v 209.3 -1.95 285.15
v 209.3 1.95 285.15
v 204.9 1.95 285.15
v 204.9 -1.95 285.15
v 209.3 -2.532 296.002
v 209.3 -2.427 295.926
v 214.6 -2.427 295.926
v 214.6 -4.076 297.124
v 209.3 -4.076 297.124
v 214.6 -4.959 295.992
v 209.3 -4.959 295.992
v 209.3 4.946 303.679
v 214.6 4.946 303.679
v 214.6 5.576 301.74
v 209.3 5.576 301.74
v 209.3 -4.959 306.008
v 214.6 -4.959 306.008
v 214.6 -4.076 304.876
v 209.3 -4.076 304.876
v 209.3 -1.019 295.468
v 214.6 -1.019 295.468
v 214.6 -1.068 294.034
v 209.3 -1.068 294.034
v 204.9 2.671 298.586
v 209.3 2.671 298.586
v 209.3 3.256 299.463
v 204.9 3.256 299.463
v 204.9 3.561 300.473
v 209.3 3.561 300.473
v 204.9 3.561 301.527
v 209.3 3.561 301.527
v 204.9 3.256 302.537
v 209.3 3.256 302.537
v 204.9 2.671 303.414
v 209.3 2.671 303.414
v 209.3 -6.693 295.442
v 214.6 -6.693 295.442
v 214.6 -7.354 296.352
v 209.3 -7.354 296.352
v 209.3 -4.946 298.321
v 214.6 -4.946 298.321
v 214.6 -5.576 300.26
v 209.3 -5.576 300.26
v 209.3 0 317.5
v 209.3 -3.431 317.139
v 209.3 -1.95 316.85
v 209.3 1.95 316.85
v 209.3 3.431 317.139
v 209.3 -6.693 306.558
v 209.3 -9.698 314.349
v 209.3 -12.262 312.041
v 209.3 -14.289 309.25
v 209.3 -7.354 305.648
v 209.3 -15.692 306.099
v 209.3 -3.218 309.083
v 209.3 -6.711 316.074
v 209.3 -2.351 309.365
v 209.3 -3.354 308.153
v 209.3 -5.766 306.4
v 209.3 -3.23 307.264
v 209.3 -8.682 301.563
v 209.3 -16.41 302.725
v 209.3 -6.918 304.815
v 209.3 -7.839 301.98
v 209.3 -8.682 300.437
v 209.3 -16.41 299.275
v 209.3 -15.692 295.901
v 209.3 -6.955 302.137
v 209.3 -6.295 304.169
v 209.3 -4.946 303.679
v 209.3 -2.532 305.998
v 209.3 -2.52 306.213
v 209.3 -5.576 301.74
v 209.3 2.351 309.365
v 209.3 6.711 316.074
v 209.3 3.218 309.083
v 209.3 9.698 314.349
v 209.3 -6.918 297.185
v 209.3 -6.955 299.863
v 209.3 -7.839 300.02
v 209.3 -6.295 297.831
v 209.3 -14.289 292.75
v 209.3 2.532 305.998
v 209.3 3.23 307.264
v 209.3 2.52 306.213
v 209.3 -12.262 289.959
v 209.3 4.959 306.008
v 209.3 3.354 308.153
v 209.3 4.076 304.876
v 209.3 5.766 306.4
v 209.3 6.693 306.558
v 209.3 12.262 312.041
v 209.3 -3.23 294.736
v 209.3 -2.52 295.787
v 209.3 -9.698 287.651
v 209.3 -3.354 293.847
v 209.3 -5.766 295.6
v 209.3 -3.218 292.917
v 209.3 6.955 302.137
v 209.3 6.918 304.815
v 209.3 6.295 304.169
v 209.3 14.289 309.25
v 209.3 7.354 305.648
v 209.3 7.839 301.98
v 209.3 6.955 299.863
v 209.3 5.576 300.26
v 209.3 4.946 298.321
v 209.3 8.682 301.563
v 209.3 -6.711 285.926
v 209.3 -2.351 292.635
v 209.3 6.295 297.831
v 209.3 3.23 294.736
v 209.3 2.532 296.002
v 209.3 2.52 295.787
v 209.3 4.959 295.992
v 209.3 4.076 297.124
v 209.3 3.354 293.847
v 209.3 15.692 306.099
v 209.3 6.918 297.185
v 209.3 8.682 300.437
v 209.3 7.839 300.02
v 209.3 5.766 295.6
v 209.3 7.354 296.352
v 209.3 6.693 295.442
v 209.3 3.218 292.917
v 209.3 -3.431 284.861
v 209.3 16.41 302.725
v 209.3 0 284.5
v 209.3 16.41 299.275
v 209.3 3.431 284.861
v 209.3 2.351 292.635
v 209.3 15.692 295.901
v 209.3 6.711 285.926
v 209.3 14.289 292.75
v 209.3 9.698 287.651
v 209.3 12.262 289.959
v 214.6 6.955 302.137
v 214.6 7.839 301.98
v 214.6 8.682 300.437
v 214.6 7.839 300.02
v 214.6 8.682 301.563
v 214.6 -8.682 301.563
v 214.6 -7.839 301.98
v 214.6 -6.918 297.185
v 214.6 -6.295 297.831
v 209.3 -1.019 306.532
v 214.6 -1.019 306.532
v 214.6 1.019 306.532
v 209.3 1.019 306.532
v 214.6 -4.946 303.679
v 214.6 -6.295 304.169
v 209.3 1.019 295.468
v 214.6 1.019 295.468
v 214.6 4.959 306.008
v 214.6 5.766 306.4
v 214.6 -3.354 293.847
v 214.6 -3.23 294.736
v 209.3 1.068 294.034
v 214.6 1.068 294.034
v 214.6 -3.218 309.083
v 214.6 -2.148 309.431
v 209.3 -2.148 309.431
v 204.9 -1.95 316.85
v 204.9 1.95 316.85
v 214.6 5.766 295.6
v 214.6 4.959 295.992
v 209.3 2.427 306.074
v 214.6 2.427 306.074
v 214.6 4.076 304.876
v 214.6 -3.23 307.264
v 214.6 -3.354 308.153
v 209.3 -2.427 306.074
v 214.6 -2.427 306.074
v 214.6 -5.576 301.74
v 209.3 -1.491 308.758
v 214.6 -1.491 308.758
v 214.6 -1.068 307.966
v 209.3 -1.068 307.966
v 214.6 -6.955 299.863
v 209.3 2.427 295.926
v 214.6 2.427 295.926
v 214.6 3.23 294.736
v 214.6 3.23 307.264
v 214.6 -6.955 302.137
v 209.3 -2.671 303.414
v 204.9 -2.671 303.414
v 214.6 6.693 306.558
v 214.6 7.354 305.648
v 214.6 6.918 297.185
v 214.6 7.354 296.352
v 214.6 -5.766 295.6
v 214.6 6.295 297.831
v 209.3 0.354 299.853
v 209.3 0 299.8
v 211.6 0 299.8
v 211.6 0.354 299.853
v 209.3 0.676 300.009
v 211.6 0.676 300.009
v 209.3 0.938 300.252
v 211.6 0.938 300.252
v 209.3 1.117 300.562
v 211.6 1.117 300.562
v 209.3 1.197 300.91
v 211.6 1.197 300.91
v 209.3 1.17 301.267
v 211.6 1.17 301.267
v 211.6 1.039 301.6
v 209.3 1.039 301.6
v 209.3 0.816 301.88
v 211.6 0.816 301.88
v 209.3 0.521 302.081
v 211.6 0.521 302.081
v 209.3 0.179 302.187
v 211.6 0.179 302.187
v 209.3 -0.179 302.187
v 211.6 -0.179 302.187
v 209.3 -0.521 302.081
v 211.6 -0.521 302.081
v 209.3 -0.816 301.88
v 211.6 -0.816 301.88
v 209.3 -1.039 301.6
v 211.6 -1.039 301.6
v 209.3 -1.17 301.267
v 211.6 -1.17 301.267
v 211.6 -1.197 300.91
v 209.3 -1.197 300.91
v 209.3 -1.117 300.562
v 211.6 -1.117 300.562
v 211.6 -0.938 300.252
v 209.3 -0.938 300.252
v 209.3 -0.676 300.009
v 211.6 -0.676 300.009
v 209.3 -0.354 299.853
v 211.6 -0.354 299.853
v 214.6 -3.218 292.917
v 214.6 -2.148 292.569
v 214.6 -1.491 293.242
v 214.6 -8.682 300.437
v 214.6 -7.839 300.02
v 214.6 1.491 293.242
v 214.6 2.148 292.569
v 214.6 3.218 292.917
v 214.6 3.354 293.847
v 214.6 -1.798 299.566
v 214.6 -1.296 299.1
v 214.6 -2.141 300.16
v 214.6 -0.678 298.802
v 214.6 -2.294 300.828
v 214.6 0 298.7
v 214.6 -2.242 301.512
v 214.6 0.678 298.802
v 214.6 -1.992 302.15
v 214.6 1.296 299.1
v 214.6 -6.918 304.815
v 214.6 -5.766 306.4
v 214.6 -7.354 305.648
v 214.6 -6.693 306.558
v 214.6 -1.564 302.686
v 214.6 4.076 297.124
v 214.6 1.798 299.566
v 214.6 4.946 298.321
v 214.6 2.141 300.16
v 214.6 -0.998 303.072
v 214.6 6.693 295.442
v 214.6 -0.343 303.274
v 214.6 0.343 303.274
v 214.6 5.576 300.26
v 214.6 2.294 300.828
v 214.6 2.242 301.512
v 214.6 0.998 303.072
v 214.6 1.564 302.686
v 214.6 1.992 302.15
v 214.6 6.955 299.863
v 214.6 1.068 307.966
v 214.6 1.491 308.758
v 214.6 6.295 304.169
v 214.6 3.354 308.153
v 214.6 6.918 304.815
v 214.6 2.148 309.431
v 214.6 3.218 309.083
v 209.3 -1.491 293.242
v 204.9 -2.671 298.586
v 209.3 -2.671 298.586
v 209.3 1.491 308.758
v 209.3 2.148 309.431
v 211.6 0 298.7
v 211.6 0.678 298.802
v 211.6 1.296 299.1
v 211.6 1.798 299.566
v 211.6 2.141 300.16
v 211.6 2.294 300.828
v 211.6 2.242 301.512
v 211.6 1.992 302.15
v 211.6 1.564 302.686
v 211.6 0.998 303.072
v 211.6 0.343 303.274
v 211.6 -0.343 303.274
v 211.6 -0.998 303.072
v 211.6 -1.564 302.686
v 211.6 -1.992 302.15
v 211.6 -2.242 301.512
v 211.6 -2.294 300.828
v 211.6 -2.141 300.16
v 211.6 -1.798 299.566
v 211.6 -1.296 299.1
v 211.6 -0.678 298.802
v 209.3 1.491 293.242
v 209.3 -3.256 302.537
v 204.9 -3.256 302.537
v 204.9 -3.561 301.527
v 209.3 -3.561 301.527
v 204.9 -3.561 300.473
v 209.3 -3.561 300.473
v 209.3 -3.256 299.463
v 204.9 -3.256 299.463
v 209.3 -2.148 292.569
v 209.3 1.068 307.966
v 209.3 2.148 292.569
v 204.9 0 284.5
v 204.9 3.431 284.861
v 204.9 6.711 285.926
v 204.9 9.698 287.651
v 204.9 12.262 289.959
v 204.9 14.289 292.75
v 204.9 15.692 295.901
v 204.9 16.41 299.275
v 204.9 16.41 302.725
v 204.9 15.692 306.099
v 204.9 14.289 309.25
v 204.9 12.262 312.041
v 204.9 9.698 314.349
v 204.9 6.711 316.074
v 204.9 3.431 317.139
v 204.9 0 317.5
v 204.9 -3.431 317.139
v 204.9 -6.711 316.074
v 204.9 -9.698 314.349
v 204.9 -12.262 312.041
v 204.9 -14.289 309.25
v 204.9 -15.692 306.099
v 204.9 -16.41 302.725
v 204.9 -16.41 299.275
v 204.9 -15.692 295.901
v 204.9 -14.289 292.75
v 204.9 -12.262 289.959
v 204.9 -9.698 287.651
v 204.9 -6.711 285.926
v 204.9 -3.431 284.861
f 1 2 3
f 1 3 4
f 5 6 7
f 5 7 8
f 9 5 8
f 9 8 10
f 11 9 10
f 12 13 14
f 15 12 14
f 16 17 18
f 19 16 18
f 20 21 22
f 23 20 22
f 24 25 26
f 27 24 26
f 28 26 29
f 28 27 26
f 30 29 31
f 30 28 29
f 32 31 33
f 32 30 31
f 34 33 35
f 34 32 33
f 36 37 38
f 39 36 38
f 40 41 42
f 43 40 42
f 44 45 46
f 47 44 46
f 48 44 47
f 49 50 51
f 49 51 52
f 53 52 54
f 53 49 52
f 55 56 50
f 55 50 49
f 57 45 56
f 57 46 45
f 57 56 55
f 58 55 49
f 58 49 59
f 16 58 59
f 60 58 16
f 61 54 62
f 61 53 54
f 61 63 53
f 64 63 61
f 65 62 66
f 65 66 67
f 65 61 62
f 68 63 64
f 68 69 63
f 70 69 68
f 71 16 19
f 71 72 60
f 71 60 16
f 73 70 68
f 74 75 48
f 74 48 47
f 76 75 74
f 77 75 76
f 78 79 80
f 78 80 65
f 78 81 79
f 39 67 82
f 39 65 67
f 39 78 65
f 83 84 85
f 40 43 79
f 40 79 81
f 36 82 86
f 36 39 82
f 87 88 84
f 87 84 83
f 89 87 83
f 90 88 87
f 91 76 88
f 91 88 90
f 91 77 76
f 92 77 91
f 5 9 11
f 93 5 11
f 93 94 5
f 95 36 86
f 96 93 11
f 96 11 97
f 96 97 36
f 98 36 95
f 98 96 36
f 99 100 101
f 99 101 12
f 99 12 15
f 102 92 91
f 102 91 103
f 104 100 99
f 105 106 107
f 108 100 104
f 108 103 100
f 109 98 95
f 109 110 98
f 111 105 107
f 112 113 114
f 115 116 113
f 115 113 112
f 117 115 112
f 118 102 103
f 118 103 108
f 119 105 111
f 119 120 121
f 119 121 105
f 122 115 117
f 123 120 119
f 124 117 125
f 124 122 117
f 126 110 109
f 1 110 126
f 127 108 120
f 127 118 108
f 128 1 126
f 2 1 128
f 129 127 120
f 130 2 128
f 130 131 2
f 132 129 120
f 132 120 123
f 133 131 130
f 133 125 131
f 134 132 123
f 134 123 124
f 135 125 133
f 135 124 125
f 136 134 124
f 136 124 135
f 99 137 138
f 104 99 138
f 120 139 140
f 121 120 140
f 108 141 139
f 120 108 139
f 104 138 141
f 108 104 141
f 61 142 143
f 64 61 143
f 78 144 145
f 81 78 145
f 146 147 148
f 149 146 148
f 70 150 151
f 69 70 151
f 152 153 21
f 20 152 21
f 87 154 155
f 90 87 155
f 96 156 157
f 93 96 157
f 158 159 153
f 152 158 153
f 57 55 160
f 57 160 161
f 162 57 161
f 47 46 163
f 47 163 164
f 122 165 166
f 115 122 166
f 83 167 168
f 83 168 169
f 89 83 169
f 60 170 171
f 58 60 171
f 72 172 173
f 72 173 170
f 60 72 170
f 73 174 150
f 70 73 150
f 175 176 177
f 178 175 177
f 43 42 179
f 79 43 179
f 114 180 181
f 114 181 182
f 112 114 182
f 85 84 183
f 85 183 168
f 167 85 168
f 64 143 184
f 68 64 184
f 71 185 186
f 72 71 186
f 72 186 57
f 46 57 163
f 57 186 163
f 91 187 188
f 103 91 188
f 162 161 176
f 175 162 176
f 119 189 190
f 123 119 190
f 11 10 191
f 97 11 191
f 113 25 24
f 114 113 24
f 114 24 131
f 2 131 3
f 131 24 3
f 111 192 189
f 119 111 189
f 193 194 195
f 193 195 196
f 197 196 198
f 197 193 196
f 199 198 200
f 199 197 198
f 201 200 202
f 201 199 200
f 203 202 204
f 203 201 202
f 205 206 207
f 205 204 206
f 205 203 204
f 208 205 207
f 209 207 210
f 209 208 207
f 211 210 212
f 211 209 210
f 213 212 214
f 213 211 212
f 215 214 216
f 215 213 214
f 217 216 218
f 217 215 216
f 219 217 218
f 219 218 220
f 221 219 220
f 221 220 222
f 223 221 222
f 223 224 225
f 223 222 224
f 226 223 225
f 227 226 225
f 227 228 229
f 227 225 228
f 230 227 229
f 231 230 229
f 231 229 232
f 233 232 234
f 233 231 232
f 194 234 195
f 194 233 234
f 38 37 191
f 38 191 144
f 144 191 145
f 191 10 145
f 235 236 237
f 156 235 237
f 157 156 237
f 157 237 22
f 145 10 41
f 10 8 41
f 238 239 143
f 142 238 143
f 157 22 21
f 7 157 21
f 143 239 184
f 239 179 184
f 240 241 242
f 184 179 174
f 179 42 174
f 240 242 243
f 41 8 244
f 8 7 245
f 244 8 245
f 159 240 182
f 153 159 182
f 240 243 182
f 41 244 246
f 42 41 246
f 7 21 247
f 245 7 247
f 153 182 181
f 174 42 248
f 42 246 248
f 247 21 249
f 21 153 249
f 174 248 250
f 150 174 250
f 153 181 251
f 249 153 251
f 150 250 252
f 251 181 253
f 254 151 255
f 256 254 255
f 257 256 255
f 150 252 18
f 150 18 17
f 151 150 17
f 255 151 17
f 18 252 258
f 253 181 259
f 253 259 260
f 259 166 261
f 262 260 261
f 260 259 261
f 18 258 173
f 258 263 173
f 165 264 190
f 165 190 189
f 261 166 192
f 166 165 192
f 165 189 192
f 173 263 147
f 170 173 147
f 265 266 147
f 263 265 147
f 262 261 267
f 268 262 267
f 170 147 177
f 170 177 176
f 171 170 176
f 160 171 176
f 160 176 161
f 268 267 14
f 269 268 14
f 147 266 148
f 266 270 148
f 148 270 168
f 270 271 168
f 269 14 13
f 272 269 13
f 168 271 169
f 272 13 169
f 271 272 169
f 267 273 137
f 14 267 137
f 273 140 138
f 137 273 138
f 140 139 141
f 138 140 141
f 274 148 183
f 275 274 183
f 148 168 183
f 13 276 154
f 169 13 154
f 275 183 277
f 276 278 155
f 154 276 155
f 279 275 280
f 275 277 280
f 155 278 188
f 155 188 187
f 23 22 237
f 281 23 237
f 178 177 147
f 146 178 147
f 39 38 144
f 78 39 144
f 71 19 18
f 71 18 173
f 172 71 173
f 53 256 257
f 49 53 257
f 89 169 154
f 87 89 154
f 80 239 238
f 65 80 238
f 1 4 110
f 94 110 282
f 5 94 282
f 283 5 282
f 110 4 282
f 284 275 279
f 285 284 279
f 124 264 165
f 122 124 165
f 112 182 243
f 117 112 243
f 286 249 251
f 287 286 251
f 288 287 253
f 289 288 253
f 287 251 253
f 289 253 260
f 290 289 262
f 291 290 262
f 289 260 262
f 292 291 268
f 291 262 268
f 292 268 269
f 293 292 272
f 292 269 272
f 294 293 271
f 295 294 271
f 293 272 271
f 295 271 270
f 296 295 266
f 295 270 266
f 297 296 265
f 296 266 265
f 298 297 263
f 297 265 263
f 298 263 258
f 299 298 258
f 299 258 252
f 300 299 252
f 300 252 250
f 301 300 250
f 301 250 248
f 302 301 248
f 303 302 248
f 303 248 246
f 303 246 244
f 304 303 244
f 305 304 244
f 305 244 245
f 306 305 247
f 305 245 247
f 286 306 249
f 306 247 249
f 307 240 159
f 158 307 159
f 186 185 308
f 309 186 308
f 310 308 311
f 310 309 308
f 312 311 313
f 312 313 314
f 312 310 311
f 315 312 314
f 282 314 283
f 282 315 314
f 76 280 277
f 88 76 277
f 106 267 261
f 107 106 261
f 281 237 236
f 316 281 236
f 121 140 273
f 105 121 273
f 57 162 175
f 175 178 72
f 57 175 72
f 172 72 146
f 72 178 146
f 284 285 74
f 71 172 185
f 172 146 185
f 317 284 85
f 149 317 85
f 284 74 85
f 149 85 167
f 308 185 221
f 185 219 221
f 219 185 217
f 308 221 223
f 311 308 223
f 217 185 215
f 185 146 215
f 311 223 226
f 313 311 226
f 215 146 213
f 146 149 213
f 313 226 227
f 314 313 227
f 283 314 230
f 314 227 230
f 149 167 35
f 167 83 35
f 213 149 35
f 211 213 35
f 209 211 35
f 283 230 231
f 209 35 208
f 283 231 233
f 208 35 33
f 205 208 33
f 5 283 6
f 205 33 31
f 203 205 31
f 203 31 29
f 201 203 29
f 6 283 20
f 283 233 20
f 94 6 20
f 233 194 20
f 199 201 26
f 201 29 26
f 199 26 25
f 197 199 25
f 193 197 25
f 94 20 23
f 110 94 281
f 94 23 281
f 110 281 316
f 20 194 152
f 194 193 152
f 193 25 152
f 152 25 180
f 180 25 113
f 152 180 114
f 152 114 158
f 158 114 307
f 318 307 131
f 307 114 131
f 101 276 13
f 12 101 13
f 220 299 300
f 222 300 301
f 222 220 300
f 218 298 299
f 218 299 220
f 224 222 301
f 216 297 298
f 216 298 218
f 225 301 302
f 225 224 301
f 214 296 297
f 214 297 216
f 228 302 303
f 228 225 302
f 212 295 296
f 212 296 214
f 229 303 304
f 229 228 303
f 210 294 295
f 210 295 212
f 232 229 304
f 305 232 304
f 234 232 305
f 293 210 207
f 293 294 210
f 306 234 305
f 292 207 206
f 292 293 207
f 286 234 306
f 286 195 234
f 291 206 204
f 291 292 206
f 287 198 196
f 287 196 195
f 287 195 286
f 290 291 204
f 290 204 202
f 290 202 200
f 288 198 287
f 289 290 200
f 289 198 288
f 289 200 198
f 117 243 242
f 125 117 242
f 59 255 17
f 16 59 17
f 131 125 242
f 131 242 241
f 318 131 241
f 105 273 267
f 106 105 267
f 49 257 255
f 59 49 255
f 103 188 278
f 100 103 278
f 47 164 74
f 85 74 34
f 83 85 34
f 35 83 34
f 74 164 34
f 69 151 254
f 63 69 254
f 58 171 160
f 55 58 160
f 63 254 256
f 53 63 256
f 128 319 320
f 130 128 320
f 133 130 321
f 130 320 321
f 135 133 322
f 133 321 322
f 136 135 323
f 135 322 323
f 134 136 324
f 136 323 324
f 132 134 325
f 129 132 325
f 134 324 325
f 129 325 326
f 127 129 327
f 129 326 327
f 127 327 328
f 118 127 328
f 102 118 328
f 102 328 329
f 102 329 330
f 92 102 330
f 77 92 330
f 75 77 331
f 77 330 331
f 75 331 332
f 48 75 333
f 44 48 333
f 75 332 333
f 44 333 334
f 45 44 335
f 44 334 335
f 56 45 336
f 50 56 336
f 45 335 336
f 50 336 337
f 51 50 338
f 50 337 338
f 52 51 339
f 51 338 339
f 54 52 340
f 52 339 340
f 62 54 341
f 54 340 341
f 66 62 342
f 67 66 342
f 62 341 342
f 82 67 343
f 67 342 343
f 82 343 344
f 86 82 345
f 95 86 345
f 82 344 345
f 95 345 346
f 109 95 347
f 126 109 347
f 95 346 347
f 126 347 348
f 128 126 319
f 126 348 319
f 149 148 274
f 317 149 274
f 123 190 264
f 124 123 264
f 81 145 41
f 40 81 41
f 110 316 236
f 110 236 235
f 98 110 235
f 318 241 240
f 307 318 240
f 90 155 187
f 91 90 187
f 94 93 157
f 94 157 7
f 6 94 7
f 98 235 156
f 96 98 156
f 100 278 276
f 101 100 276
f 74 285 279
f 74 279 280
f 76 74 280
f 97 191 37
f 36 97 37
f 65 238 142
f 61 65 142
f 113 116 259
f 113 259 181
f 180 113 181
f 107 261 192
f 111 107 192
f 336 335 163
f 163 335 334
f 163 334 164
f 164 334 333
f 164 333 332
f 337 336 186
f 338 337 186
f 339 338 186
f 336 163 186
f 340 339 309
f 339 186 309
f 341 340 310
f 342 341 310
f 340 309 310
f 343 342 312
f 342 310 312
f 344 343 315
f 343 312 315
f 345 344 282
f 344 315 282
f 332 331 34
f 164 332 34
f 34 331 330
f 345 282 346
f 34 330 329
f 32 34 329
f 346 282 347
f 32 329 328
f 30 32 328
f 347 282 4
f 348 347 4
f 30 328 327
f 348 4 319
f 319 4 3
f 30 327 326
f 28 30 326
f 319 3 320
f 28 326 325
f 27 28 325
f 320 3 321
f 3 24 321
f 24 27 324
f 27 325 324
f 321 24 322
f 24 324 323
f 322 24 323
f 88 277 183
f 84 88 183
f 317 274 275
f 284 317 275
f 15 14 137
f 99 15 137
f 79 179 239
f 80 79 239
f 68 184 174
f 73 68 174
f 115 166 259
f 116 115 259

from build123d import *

# Parameters (mm, degrees)
SKETCH1_R           = 16.5
BOSS_EXTRUDE1_DEPTH = 4.4
BOSS_EXTRUDE2_DEPTH = 5.3
SKETCH3_R           = 3.6
CUT_EXTRUDE1_DEPTH  = 4.4
CUT_EXTRUDE2_DEPTH  = 4.4
SKETCH5_R           = 1.2
CUT_EXTRUDE3_DEPTH  = 319.076390196
SKETCH6_R           = 2.3
CUT_EXTRUDE4_DEPTH  = 3


with BuildPart() as part:
    # Sketch1 → Boss-Extrude1 (new body)
    with BuildSketch(Plane(origin=(204.9, 0, 0), x_dir=(0, 0, -1), z_dir=(1, 0, 0))):
        with Locations((-301, 0)):
            Circle(SKETCH1_R)
    extrude(amount=BOSS_EXTRUDE1_DEPTH)

    # Sketch2 → Boss-Extrude2 (add)
    with BuildSketch(Plane(origin=(209.3, 0, 0), x_dir=(0, 0, -1), z_dir=(1, 0, 0))):
        Polygon((-306.532, 1.019), (-307.966, 1.068), (-308.758, 1.491), (-309.431, 2.148), (-309.083, 3.218), (-308.153, 3.354), (-307.264, 3.23), (-306.074, 2.427), (-304.876, 4.076), (-306.008, 4.959), (-306.4, 5.766), (-306.558, 6.693), (-305.648, 7.354), (-304.815, 6.918), (-304.169, 6.295), (-303.679, 4.946), (-301.74, 5.576), (-302.137, 6.955), (-301.98, 7.839), (-301.563, 8.682), (-300.437, 8.682), (-300.02, 7.839), (-299.863, 6.955), (-300.26, 5.576), (-298.321, 4.946), (-297.831, 6.295), (-297.185, 6.918), (-296.352, 7.354), (-295.442, 6.693), (-295.6, 5.766), (-295.992, 4.959), (-297.124, 4.076), (-295.926, 2.427), (-294.736, 3.23), (-293.847, 3.354), (-292.917, 3.218), (-292.569, 2.148), (-293.242, 1.491), (-294.034, 1.068), (-295.468, 1.019), (-295.468, -1.019), (-294.034, -1.068), (-293.242, -1.491), (-292.569, -2.148), (-292.917, -3.218), (-293.847, -3.354), (-294.736, -3.23), (-295.926, -2.427), (-297.124, -4.076), (-295.992, -4.959), (-295.6, -5.766), (-295.442, -6.693), (-296.352, -7.354), (-297.185, -6.918), (-297.831, -6.295), (-298.321, -4.946), (-300.26, -5.576), (-299.863, -6.955), (-300.02, -7.839), (-300.437, -8.682), (-301.563, -8.682), (-301.98, -7.839), (-302.137, -6.955), (-301.74, -5.576), (-303.679, -4.946), (-304.169, -6.295), (-304.815, -6.918), (-305.648, -7.354), (-306.558, -6.693), (-306.4, -5.766), (-306.008, -4.959), (-304.876, -4.076), (-306.074, -2.427), (-307.264, -3.23), (-308.153, -3.354), (-309.083, -3.218), (-309.431, -2.148), (-308.758, -1.491), (-307.966, -1.068), (-306.532, -1.019), align=None)
    extrude(amount=BOSS_EXTRUDE2_DEPTH)

    # Sketch3 → Cut-Extrude1 (cut)
    with BuildSketch(Plane(origin=(204.9, 0, 0), x_dir=(0, 0, -1), z_dir=(1, 0, 0))):
        with Locations((-301, 0)):
            Circle(SKETCH3_R)
    extrude(amount=CUT_EXTRUDE1_DEPTH, mode=Mode.SUBTRACT)

    # Sketch4 → Cut-Extrude2 (cut)
    with BuildSketch(Plane(origin=(204.9, 0, 0), x_dir=(0, 0, -1), z_dir=(1, 0, 0))):
        Polygon((-285.15, -1.95), (-301, -2.8), (-316.85, -1.95), (-316.85, 1.95), (-301, 2.8), (-285.15, 1.95), align=None)
    extrude(amount=CUT_EXTRUDE2_DEPTH, mode=Mode.SUBTRACT)

    # Sketch5 → Cut-Extrude3 (cut, through all)
    with BuildSketch(Plane(origin=(204.9, 0, 0), x_dir=(0, 0, -1), z_dir=(1, 0, 0))):
        with Locations((-301, 0)):
            Circle(SKETCH5_R)
    extrude(amount=CUT_EXTRUDE3_DEPTH, mode=Mode.SUBTRACT)

    # Sketch6 → Cut-Extrude4 (cut)
    with BuildSketch(Plane(origin=(214.6, 0, 0), x_dir=(0, 0, -1), z_dir=(1, 0, 0))):
        with Locations((-301, 0)):
            Circle(SKETCH6_R)
    extrude(amount=-CUT_EXTRUDE4_DEPTH, mode=Mode.SUBTRACT)


solid = part.part
